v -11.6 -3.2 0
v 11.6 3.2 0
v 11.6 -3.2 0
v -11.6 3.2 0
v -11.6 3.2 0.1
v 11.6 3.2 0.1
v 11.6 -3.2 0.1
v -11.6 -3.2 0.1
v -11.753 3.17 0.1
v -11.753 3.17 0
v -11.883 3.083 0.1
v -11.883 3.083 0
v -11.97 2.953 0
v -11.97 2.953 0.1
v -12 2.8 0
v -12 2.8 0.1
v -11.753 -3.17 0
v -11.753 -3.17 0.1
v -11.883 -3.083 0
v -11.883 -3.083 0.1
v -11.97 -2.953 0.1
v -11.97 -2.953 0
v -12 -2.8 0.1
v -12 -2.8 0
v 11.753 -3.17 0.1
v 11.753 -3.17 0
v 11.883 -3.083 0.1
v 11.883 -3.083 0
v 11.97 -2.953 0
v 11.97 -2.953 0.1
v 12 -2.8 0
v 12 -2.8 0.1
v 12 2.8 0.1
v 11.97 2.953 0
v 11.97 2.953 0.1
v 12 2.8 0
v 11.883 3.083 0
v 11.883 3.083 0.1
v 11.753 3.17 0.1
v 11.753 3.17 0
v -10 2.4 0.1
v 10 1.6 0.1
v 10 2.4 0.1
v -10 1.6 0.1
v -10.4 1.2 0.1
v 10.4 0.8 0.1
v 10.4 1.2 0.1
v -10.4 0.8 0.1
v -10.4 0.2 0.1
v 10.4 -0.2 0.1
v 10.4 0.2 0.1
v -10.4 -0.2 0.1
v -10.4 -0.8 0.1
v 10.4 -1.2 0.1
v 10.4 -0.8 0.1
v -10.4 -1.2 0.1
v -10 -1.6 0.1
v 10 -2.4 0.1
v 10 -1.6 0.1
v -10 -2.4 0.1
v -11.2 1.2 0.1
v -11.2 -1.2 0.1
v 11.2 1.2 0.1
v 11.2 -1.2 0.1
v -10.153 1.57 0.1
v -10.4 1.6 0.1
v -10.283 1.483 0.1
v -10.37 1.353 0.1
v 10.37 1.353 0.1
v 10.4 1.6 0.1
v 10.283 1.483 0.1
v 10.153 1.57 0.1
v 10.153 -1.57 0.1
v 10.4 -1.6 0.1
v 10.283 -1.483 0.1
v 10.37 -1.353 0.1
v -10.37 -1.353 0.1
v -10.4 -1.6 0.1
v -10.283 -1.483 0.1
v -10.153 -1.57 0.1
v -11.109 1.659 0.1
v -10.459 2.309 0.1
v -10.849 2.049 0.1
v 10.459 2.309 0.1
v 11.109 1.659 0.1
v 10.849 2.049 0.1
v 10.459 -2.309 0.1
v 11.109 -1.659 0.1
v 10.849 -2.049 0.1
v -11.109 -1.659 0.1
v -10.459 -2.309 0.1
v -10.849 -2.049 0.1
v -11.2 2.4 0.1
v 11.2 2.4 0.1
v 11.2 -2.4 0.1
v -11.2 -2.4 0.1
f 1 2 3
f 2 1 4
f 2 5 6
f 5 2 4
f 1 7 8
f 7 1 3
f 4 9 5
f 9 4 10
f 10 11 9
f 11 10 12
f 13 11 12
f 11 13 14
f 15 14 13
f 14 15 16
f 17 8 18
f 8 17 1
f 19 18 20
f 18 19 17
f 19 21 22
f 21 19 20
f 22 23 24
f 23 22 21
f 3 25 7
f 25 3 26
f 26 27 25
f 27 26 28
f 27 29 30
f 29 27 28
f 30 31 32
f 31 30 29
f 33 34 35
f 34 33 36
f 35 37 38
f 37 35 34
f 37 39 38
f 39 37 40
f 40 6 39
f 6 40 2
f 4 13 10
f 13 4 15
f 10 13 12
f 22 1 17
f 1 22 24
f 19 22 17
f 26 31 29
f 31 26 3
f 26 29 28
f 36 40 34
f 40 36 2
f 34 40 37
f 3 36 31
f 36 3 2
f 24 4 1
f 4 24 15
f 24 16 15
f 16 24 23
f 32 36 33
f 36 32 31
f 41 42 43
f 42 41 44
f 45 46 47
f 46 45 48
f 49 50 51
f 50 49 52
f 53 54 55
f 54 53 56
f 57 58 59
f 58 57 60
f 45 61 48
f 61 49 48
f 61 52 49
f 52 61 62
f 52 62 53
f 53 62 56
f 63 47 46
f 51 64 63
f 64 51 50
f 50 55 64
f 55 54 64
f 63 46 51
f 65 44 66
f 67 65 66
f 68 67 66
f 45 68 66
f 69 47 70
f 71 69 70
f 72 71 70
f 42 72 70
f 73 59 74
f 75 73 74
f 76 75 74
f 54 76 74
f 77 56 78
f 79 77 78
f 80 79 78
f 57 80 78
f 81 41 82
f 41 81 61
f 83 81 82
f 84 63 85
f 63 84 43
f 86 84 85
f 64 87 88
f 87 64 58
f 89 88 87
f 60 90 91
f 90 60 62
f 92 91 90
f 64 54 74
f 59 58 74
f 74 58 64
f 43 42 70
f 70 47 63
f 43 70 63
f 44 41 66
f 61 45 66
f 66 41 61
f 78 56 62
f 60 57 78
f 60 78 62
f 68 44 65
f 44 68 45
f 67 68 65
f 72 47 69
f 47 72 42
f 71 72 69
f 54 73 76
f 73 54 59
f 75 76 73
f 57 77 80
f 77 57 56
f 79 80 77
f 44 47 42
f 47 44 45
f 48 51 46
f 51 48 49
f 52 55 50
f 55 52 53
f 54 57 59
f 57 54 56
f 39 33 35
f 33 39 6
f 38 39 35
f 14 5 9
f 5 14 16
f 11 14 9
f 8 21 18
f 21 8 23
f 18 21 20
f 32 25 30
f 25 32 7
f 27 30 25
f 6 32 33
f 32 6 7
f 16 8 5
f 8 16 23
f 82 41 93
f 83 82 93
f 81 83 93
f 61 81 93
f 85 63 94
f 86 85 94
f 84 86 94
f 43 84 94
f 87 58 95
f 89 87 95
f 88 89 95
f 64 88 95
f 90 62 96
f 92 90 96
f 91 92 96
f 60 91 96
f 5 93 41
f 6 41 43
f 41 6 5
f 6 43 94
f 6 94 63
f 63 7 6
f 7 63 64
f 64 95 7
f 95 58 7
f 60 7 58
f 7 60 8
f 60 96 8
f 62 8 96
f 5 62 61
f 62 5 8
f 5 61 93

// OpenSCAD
// file: ../p/4-4edge.scad
use <../lib.scad>
$fa=1; $fs=0.2;
function ldraw_lib__4_4edge(realsolid=false) = [
// 0 Circle 1.0
// 0 Name: 4-4edge.dat
// 0 Author: James Jessiman
// 0 !LDRAW_ORG Primitive UPDATE 2017-01
// 0 !LICENSE Licensed under CC BY 2.0 and CC BY 4.0 : see CAreadme.txt
// 
// 0 BFC CERTIFY CCW
  [0,"BFC","CERTIFY"],
  [0,"BFC","CCW"],
// 
// 0 !HISTORY 1998-12-15 [PTadmin] Official Update 1998-10
// 0 !HISTORY 2005-12-28 [PTadmin] Official Update 2005-01
// 0 !HISTORY 2007-06-24 [PTadmin] Header formatted for Contributor Agreement
// 0 !HISTORY 2008-07-01 [PTadmin] Official Update 2008-01
// 0 !HISTORY 2017-01-15 [Steffen] BFCed
// 0 !HISTORY 2017-12-30 [PTadmin] Official Update 2017-01
// 
// 
// 2 24 1 0 0 0.9239 0 0.3827
  [2,24,1,0,0,0.9239,0,0.3827],
// 2 24 0.9239 0 0.3827 0.7071 0 0.7071
  [2,24,0.9239,0,0.3827,0.7071,0,0.7071],
// 2 24 0.7071 0 0.7071 0.3827 0 0.9239
  [2,24,0.7071,0,0.7071,0.3827,0,0.9239],
// 2 24 0.3827 0 0.9239 0 0 1
  [2,24,0.3827,0,0.9239,0,0,1],
// 2 24 0 0 1 -0.3827 0 0.9239
  [2,24,0,0,1,-0.3827,0,0.9239],
// 2 24 -0.3827 0 0.9239 -0.7071 0 0.7071
  [2,24,-0.3827,0,0.9239,-0.7071,0,0.7071],
// 2 24 -0.7071 0 0.7071 -0.9239 0 0.3827
  [2,24,-0.7071,0,0.7071,-0.9239,0,0.3827],
// 2 24 -0.9239 0 0.3827 -1 0 -0
  [2,24,-0.9239,0,0.3827,-1,0,-0],
// 2 24 -1 0 -0 -0.9239 0 -0.3827
  [2,24,-1,0,-0,-0.9239,0,-0.3827],
// 2 24 -0.9239 0 -0.3827 -0.7071 0 -0.7071
  [2,24,-0.9239,0,-0.3827,-0.7071,0,-0.7071],
// 2 24 -0.7071 0 -0.7071 -0.3827 0 -0.9239
  [2,24,-0.7071,0,-0.7071,-0.3827,0,-0.9239],
// 2 24 -0.3827 0 -0.9239 0 0 -1
  [2,24,-0.3827,0,-0.9239,0,0,-1],
// 2 24 0 0 -1 0.3827 0 -0.9239
  [2,24,0,0,-1,0.3827,0,-0.9239],
// 2 24 0.3827 0 -0.9239 0.7071 0 -0.7071
  [2,24,0.3827,0,-0.9239,0.7071,0,-0.7071],
// 2 24 0.7071 0 -0.7071 0.9239 0 -0.3827
  [2,24,0.7071,0,-0.7071,0.9239,0,-0.3827],
// 2 24 0.9239 0 -0.3827 1 0 0
  [2,24,0.9239,0,-0.3827,1,0,0],
];
module ldraw_lib__4_4edge(step=0, col=false, unit=2/5, alt=false, line=0.2, solid=!$preview)
    makepoly(ldraw_lib__4_4edge(solid), step=step, col=col, unit=unit, alt=alt, line=line, solid=solid);
ldraw_lib__4_4edge(line=0.2);
// file: ../p/4-4disc.scad
use <../lib.scad>
$fa=1; $fs=0.2;
function ldraw_lib__4_4disc(realsolid=false) = [
// 0 Disc 1.0
// 0 Name: 4-4disc.dat
// 0 Author: James Jessiman
// 0 !LDRAW_ORG Primitive UPDATE 2002-02
// 0 !LICENSE Licensed under CC BY 2.0 and CC BY 4.0 : see CAreadme.txt
// 
// 0 BFC CERTIFY CCW
  [0,"BFC","CERTIFY"],
  [0,"BFC","CCW"],
// 
// 0 !HISTORY 1998-12-15 [PTadmin] Official Update 1998-10
// 0 !HISTORY 2002-03-23 [sbliss] Added BFC statement
// 0 !HISTORY 2002-04-25 [PTadmin] Official Update 2002-02
// 0 !HISTORY 2007-06-24 [PTadmin] Header formatted for Contributor Agreement
// 0 !HISTORY 2008-07-01 [PTadmin] Official Update 2008-01
// 
// 
// 3 16 0 0 0 1 0 0 0.9239 0 0.3827
  [3,16,0,0,0,1,0,0,0.9239,0,0.3827],
// 3 16 0 0 0 0.9239 0 0.3827 0.7071 0 0.7071
  [3,16,0,0,0,0.9239,0,0.3827,0.7071,0,0.7071],
// 3 16 0 0 0 0.7071 0 0.7071 0.3827 0 0.9239
  [3,16,0,0,0,0.7071,0,0.7071,0.3827,0,0.9239],
// 3 16 0 0 0 0.3827 0 0.9239 0 0 1
  [3,16,0,0,0,0.3827,0,0.9239,0,0,1],
// 3 16 0 0 0 0 0 1 -0.3827 0 0.9239
  [3,16,0,0,0,0,0,1,-0.3827,0,0.9239],
// 3 16 0 0 0 -0.3827 0 0.9239 -0.7071 0 0.7071
  [3,16,0,0,0,-0.3827,0,0.9239,-0.7071,0,0.7071],
// 3 16 0 0 0 -0.7071 0 0.7071 -0.9239 0 0.3827
  [3,16,0,0,0,-0.7071,0,0.7071,-0.9239,0,0.3827],
// 3 16 0 0 0 -0.9239 0 0.3827 -1 0 -0
  [3,16,0,0,0,-0.9239,0,0.3827,-1,0,-0],
// 3 16 0 0 0 -1 0 -0 -0.9239 0 -0.3827
  [3,16,0,0,0,-1,0,-0,-0.9239,0,-0.3827],
// 3 16 0 0 0 -0.9239 0 -0.3827 -0.7071 0 -0.7071
  [3,16,0,0,0,-0.9239,0,-0.3827,-0.7071,0,-0.7071],
// 3 16 0 0 0 -0.7071 0 -0.7071 -0.3827 0 -0.9239
  [3,16,0,0,0,-0.7071,0,-0.7071,-0.3827,0,-0.9239],
// 3 16 0 0 0 -0.3827 0 -0.9239 0 0 -1
  [3,16,0,0,0,-0.3827,0,-0.9239,0,0,-1],
// 3 16 0 0 0 0 0 -1 0.3827 0 -0.9239
  [3,16,0,0,0,0,0,-1,0.3827,0,-0.9239],
// 3 16 0 0 0 0.3827 0 -0.9239 0.7071 0 -0.7071
  [3,16,0,0,0,0.3827,0,-0.9239,0.7071,0,-0.7071],
// 3 16 0 0 0 0.7071 0 -0.7071 0.9239 0 -0.3827
  [3,16,0,0,0,0.7071,0,-0.7071,0.9239,0,-0.3827],
// 3 16 0 0 0 0.9239 0 -0.3827 1 0 0
  [3,16,0,0,0,0.9239,0,-0.3827,1,0,0],
// 0
];
module ldraw_lib__4_4disc(step=0, col=false, unit=2/5, alt=false, line=0.2, solid=!$preview)
    makepoly(ldraw_lib__4_4disc(solid), step=step, col=col, unit=unit, alt=alt, line=line, solid=solid);
ldraw_lib__4_4disc(line=0.2);
// file: ../p/4-4cyli.scad
use <../lib.scad>
$fa=1; $fs=0.2;
function ldraw_lib__4_4cyli(realsolid=false) = [
// 0 Cylinder 1.0
// 0 Name: 4-4cyli.dat
// 0 Author: James Jessiman
// 0 !LDRAW_ORG Primitive UPDATE 2005-01
// 0 !LICENSE Licensed under CC BY 2.0 and CC BY 4.0 : see CAreadme.txt
// 
// 0 BFC CERTIFY CCW
  [0,"BFC","CERTIFY"],
  [0,"BFC","CCW"],
// 
// 0 !HISTORY 1998-12-15 [PTadmin] Official Update 1998-10
// 0 !HISTORY 2002-03-23 [sbliss] Added BFC statement; merged headers from files in distributions LDraw 0.27 and Complete.
// 0 !HISTORY 2002-04-25 [PTadmin] Official Update 2002-02
// 0 !HISTORY 2004-12-14 [guyvivan] BFC CCW
// 0 !HISTORY 2005-12-28 [PTadmin] Official Update 2005-01
// 0 !HISTORY 2007-06-24 [PTadmin] Header formatted for Contributor Agreement
// 0 !HISTORY 2008-07-01 [PTadmin] Official Update 2008-01
// 
// 
// 4 16 1 1 0 0.9239 1 0.3827 0.9239 0 0.3827 1 0 0
  [4,16,1,1,0,0.9239,1,0.3827,0.9239,0,0.3827,1,0,0],
// 5 24 1 0 0 1 1 0 0.9239 0 0.3827 0.9239 0 -0.3827
  [5,24,1,0,0,1,1,0,0.9239,0,0.3827,0.9239,0,-0.3827],
// 4 16 0.9239 1 0.3827 0.7071 1 0.7071 0.7071 0 0.7071 0.9239 0 0.3827
  [4,16,0.9239,1,0.3827,0.7071,1,0.7071,0.7071,0,0.7071,0.9239,0,0.3827],
// 5 24 0.9239 0 0.3827 0.9239 1 0.3827 0.7071 0 0.7071 1 0 0
  [5,24,0.9239,0,0.3827,0.9239,1,0.3827,0.7071,0,0.7071,1,0,0],
// 4 16 0.7071 1 0.7071 0.3827 1 0.9239 0.3827 0 0.9239 0.7071 0 0.7071
  [4,16,0.7071,1,0.7071,0.3827,1,0.9239,0.3827,0,0.9239,0.7071,0,0.7071],
// 5 24 0.7071 0 0.7071 0.7071 1 0.7071 0.3827 0 0.9239 0.9239 0 0.3827
  [5,24,0.7071,0,0.7071,0.7071,1,0.7071,0.3827,0,0.9239,0.9239,0,0.3827],
// 4 16 0.3827 1 0.9239 0 1 1 0 0 1 0.3827 0 0.9239
  [4,16,0.3827,1,0.9239,0,1,1,0,0,1,0.3827,0,0.9239],
// 5 24 0.3827 0 0.9239 0.3827 1 0.9239 0 0 1 0.7071 0 0.7071
  [5,24,0.3827,0,0.9239,0.3827,1,0.9239,0,0,1,0.7071,0,0.7071],
// 4 16 0 1 1 -0.3827 1 0.9239 -0.3827 0 0.9239 0 0 1
  [4,16,0,1,1,-0.3827,1,0.9239,-0.3827,0,0.9239,0,0,1],
// 5 24 0 0 1 0 1 1 -0.3827 0 0.9239 0.3827 0 0.9239
  [5,24,0,0,1,0,1,1,-0.3827,0,0.9239,0.3827,0,0.9239],
// 4 16 -0.3827 1 0.9239 -0.7071 1 0.7071 -0.7071 0 0.7071 -0.3827 0 0.9239
  [4,16,-0.3827,1,0.9239,-0.7071,1,0.7071,-0.7071,0,0.7071,-0.3827,0,0.9239],
// 5 24 -0.3827 0 0.9239 -0.3827 1 0.9239 -0.7071 0 0.7071 0 0 1
  [5,24,-0.3827,0,0.9239,-0.3827,1,0.9239,-0.7071,0,0.7071,0,0,1],
// 4 16 -0.7071 1 0.7071 -0.9239 1 0.3827 -0.9239 0 0.3827 -0.7071 0 0.7071
  [4,16,-0.7071,1,0.7071,-0.9239,1,0.3827,-0.9239,0,0.3827,-0.7071,0,0.7071],
// 5 24 -0.7071 0 0.7071 -0.7071 1 0.7071 -0.9239 0 0.3827 -0.3827 0 0.9239
  [5,24,-0.7071,0,0.7071,-0.7071,1,0.7071,-0.9239,0,0.3827,-0.3827,0,0.9239],
// 4 16 -0.9239 1 0.3827 -1 1 0 -1 0 0 -0.9239 0 0.3827
  [4,16,-0.9239,1,0.3827,-1,1,0,-1,0,0,-0.9239,0,0.3827],
// 5 24 -0.9239 0 0.3827 -0.9239 1 0.3827 -1 0 0 -0.7071 0 0.7071
  [5,24,-0.9239,0,0.3827,-0.9239,1,0.3827,-1,0,0,-0.7071,0,0.7071],
// 4 16 -1 1 0 -0.9239 1 -0.3827 -0.9239 0 -0.3827 -1 0 0
  [4,16,-1,1,0,-0.9239,1,-0.3827,-0.9239,0,-0.3827,-1,0,0],
// 5 24 -1 0 0 -1 1 0 -0.9239 0 -0.3827 -0.9239 0 0.3827
  [5,24,-1,0,0,-1,1,0,-0.9239,0,-0.3827,-0.9239,0,0.3827],
// 4 16 -0.9239 1 -0.3827 -0.7071 1 -0.7071 -0.7071 0 -0.7071 -0.9239 0 -0.3827
  [4,16,-0.9239,1,-0.3827,-0.7071,1,-0.7071,-0.7071,0,-0.7071,-0.9239,0,-0.3827],
// 5 24 -0.9239 0 -0.3827 -0.9239 1 -0.3827 -0.7071 0 -0.7071 -1 0 0
  [5,24,-0.9239,0,-0.3827,-0.9239,1,-0.3827,-0.7071,0,-0.7071,-1,0,0],
// 4 16 -0.7071 1 -0.7071 -0.3827 1 -0.9239 -0.3827 0 -0.9239 -0.7071 0 -0.7071
  [4,16,-0.7071,1,-0.7071,-0.3827,1,-0.9239,-0.3827,0,-0.9239,-0.7071,0,-0.7071],
// 5 24 -0.7071 0 -0.7071 -0.7071 1 -0.7071 -0.3827 0 -0.9239 -0.9239 0 -0.3827
  [5,24,-0.7071,0,-0.7071,-0.7071,1,-0.7071,-0.3827,0,-0.9239,-0.9239,0,-0.3827],
// 4 16 -0.3827 1 -0.9239 0 1 -1 0 0 -1 -0.3827 0 -0.9239
  [4,16,-0.3827,1,-0.9239,0,1,-1,0,0,-1,-0.3827,0,-0.9239],
// 5 24 -0.3827 0 -0.9239 -0.3827 1 -0.9239 0 0 -1 -0.7071 0 -0.7071
  [5,24,-0.3827,0,-0.9239,-0.3827,1,-0.9239,0,0,-1,-0.7071,0,-0.7071],
// 4 16 0 1 -1 0.3827 1 -0.9239 0.3827 0 -0.9239 0 0 -1
  [4,16,0,1,-1,0.3827,1,-0.9239,0.3827,0,-0.9239,0,0,-1],
// 5 24 0 0 -1 0 1 -1 0.3827 0 -0.9239 -0.3827 0 -0.9239
  [5,24,0,0,-1,0,1,-1,0.3827,0,-0.9239,-0.3827,0,-0.9239],
// 4 16 0.3827 1 -0.9239 0.7071 1 -0.7071 0.7071 0 -0.7071 0.3827 0 -0.9239
  [4,16,0.3827,1,-0.9239,0.7071,1,-0.7071,0.7071,0,-0.7071,0.3827,0,-0.9239],
// 5 24 0.3827 0 -0.9239 0.3827 1 -0.9239 0.7071 0 -0.7071 0 0 -1
  [5,24,0.3827,0,-0.9239,0.3827,1,-0.9239,0.7071,0,-0.7071,0,0,-1],
// 4 16 0.7071 1 -0.7071 0.9239 1 -0.3827 0.9239 0 -0.3827 0.7071 0 -0.7071
  [4,16,0.7071,1,-0.7071,0.9239,1,-0.3827,0.9239,0,-0.3827,0.7071,0,-0.7071],
// 5 24 0.7071 0 -0.7071 0.7071 1 -0.7071 0.9239 0 -0.3827 0.3827 0 -0.9239
  [5,24,0.7071,0,-0.7071,0.7071,1,-0.7071,0.9239,0,-0.3827,0.3827,0,-0.9239],
// 4 16 0.9239 1 -0.3827 1 1 0 1 0 0 0.9239 0 -0.3827
  [4,16,0.9239,1,-0.3827,1,1,0,1,0,0,0.9239,0,-0.3827],
// 5 24 0.9239 0 -0.3827 0.9239 1 -0.3827 1 0 0 0.7071 0 -0.7071
  [5,24,0.9239,0,-0.3827,0.9239,1,-0.3827,1,0,0,0.7071,0,-0.7071],
// 0
];
module ldraw_lib__4_4cyli(step=0, col=false, unit=2/5, alt=false, line=0.2, solid=!$preview)
    makepoly(ldraw_lib__4_4cyli(solid), step=step, col=col, unit=unit, alt=alt, line=line, solid=solid);
ldraw_lib__4_4cyli(line=0.2);
// file: ../p/stud3.scad
use <../lib.scad>
use <4-4cyli.scad>
use <4-4disc.scad>
use <4-4edge.scad>
$fa=1; $fs=0.2;
function ldraw_lib__stud3(realsolid=false) = realsolid ? 
    [openscad(translate([0,0,-eps()], o=cylinder(4+eps(), r=4)),2)] : [
// 0 Stud Tube Solid
// 0 Name: stud3.dat
// 0 Author: James Jessiman
// 0 !LDRAW_ORG Primitive UPDATE 2012-01
// 0 !LICENSE Licensed under CC BY 2.0 and CC BY 4.0 : see CAreadme.txt
// 
// 0 BFC CERTIFY CCW
  [0,"BFC","CERTIFY"],
  [0,"BFC","CCW"],
// 
// 0 !HISTORY 2002-04-04 [sbliss] Modified for BFC compliance
// 0 !HISTORY 2002-04-25 [PTadmin] Official Update 2002-02
// 0 !HISTORY 2007-06-24 [PTadmin] Header formatted for Contributor Agreement
// 0 !HISTORY 2008-07-01 [PTadmin] Official Update 2008-01
// 0 !HISTORY 2012-02-16 [Philo] Changed to CCW
// 0 !HISTORY 2012-03-30 [PTadmin] Official Update 2012-01
// 
// 
// 1 16 0 -4 0 4 0 0 0 1 0 0 0 4 4-4edge.dat
  [1,16,0,-4,0,4,0,0,0,1,0,0,0,4, ldraw_lib__4_4edge(realsolid)],
// 1 16 0 0 0 4 0 0 0 1 0 0 0 4 4-4edge.dat
  [1,16,0,0,0,4,0,0,0,1,0,0,0,4, ldraw_lib__4_4edge(realsolid)],
// 1 16 0 -4 0 4 0 0 0 1 0 0 0 4 4-4disc.dat
  [1,16,0,-4,0,4,0,0,0,1,0,0,0,4, ldraw_lib__4_4disc(realsolid)],
// 1 16 0 -4 0 4 0 0 0 4 0 0 0 4 4-4cyli.dat
  [1,16,0,-4,0,4,0,0,0,4,0,0,0,4, ldraw_lib__4_4cyli(realsolid)],
];
module ldraw_lib__stud3(step=0, col=false, unit=2/5, alt=false, line=0.2, solid=!$preview)
    makepoly(ldraw_lib__stud3(solid), step=step, col=col, unit=unit, alt=alt, line=line, solid=solid);
ldraw_lib__stud3(line=0.2);
// file: ../p/stud.scad
use <../lib.scad>
use <4-4cyli.scad>
use <4-4disc.scad>
use <4-4edge.scad>
$fa=1; $fs=0.2;
function ldraw_lib__stud(realsolid=false) = realsolid ? 
    [openscad(translate([0,0,-eps()], o=cylinder(4+eps(), r=6)),2)] : [
// 0 Stud
// 0 Name: stud.dat
// 0 Author: James Jessiman
// 0 !LDRAW_ORG Primitive UPDATE 2012-01
// 0 !LICENSE Licensed under CC BY 2.0 and CC BY 4.0 : see CAreadme.txt
// 
// 0 BFC CERTIFY CCW
  [0,"BFC","CERTIFY"],
  [0,"BFC","CCW"],
// 
// 0 !HISTORY 2002-04-04 [sbliss] Modified for BFC compliance
// 0 !HISTORY 2002-04-25 [PTadmin] Official Update 2002-02
// 0 !HISTORY 2007-06-24 [PTadmin] Header formatted for Contributor Agreement
// 0 !HISTORY 2008-07-01 [PTadmin] Official Update 2008-01
// 0 !HISTORY 2012-02-16 [Philo] Changed to CCW
// 0 !HISTORY 2012-03-30 [PTadmin] Official Update 2012-01
// 
// 
// 1 16 0 0 0 6 0 0 0 1 0 0 0 6 4-4edge.dat
  [1,16,0,0,0,6,0,0,0,1,0,0,0,6, ldraw_lib__4_4edge(realsolid)],
// 1 16 0 -4 0 6 0 0 0 1 0 0 0 6 4-4edge.dat
  [1,16,0,-4,0,6,0,0,0,1,0,0,0,6, ldraw_lib__4_4edge(realsolid)],
// 1 16 0 0 0 6 0 0 0 -4 0 0 0 6 4-4cyli.dat
  [1,16,0,0,0,6,0,0,0,-4,0,0,0,6, ldraw_lib__4_4cyli(realsolid)],
// 1 16 0 -4 0 6 0 0 0 1 0 0 0 6 4-4disc.dat
  [1,16,0,-4,0,6,0,0,0,1,0,0,0,6, ldraw_lib__4_4disc(realsolid)],
];
module ldraw_lib__stud(step=0, col=false, unit=2/5, alt=false, line=0.2, solid=!$preview)
    makepoly(ldraw_lib__stud(solid), step=step, col=col, unit=unit, alt=alt, line=line, solid=solid);
ldraw_lib__stud(line=0.2);
// file: ../p/box5.scad
use <../lib.scad>
$fa=1; $fs=0.2;
function ldraw_lib__box5(realsolid=false) = [
// 0 Box with 5 Faces and All Edges
// 0 Name: box5.dat
// 0 Author: James Jessiman
// 0 !LDRAW_ORG Primitive UPDATE 2012-01
// 0 !LICENSE Licensed under CC BY 2.0 and CC BY 4.0 : see CAreadme.txt
// 
// 0 BFC CERTIFY CCW
  [0,"BFC","CERTIFY"],
  [0,"BFC","CCW"],
// 
// 0 !HISTORY 2002-04-03 [sbliss] Modified for BFC compliance
// 0 !HISTORY 2002-04-25 [PTadmin] Official Update 2002-02
// 0 !HISTORY 2007-06-24 [PTadmin] Header formatted for Contributor Agreement
// 0 !HISTORY 2008-07-01 [PTadmin] Official Update 2008-01
// 0 !HISTORY 2012-02-16 [Philo] Changed to CCW
// 0 !HISTORY 2012-03-30 [PTadmin] Official Update 2012-01
// 
// 
// 2 24 1 1 1 -1 1 1
  [2,24,1,1,1,-1,1,1],
// 2 24 -1 1 1 -1 1 -1
  [2,24,-1,1,1,-1,1,-1],
// 2 24 -1 1 -1 1 1 -1
  [2,24,-1,1,-1,1,1,-1],
// 2 24 1 1 -1 1 1 1
  [2,24,1,1,-1,1,1,1],
// 2 24 1 0 1 -1 0 1
  [2,24,1,0,1,-1,0,1],
// 2 24 -1 0 1 -1 0 -1
  [2,24,-1,0,1,-1,0,-1],
// 2 24 -1 0 -1 1 0 -1
  [2,24,-1,0,-1,1,0,-1],
// 2 24 1 0 -1 1 0 1
  [2,24,1,0,-1,1,0,1],
// 2 24 1 0 1 1 1 1
  [2,24,1,0,1,1,1,1],
// 2 24 -1 0 1 -1 1 1
  [2,24,-1,0,1,-1,1,1],
// 2 24 1 0 -1 1 1 -1
  [2,24,1,0,-1,1,1,-1],
// 2 24 -1 0 -1 -1 1 -1
  [2,24,-1,0,-1,-1,1,-1],
// 4 16 -1 1 1 1 1 1 1 1 -1 -1 1 -1
  [4,16,-1,1,1,1,1,1,1,1,-1,-1,1,-1],
// 4 16 -1 1 1 -1 0 1 1 0 1 1 1 1
  [4,16,-1,1,1,-1,0,1,1,0,1,1,1,1],
// 4 16 -1 1 -1 -1 0 -1 -1 0 1 -1 1 1
  [4,16,-1,1,-1,-1,0,-1,-1,0,1,-1,1,1],
// 4 16 1 1 -1 1 0 -1 -1 0 -1 -1 1 -1
  [4,16,1,1,-1,1,0,-1,-1,0,-1,-1,1,-1],
// 4 16 1 1 1 1 0 1 1 0 -1 1 1 -1
  [4,16,1,1,1,1,0,1,1,0,-1,1,1,-1],
];
module ldraw_lib__box5(step=0, col=false, unit=2/5, alt=false, line=0.2, solid=!$preview)
    makepoly(ldraw_lib__box5(solid), step=step, col=col, unit=unit, alt=alt, line=line, solid=solid);
ldraw_lib__box5(line=0.2);
// file: ../p/box4t.scad
use <../lib.scad>
$fa=1; $fs=0.2;
function ldraw_lib__box4t(realsolid=false) = [
// 0 Box with 4 Adjacent Faces and All Edges
// 0 Name: box4t.dat
// 0 Author: Tore Eriksson [Tore_Eriksson]
// 0 !LDRAW_ORG Primitive UPDATE 2003-02
// 0 !LICENSE Licensed under CC BY 2.0 and CC BY 4.0 : see CAreadme.txt
// 
// 0 BFC CERTIFY CCW
  [0,"BFC","CERTIFY"],
  [0,"BFC","CCW"],
// 
// 0 !HISTORY 1997-09-29 [PTadmin] Official Update 1997-15
// 0 !HISTORY 2002-08-31 [izanette] Modified with WINDZ for BFC compliance
// 0 !HISTORY 2003-08-01 [PTadmin] Official Update 2003-02
// 0 !HISTORY 2007-06-24 [PTadmin] Header formatted for Contributor Agreement
// 0 !HISTORY 2008-07-01 [PTadmin] Official Update 2008-01
// 
// 
// 2 24 1 1 1 -1 1 1
  [2,24,1,1,1,-1,1,1],
// 2 24 -1 1 1 -1 1 -1
  [2,24,-1,1,1,-1,1,-1],
// 2 24 -1 1 -1 1 1 -1
  [2,24,-1,1,-1,1,1,-1],
// 2 24 1 1 -1 1 1 1
  [2,24,1,1,-1,1,1,1],
// 2 24 1 0 1 -1 0 1
  [2,24,1,0,1,-1,0,1],
// 2 24 -1 0 1 -1 0 -1
  [2,24,-1,0,1,-1,0,-1],
// 2 24 -1 0 -1 1 0 -1
  [2,24,-1,0,-1,1,0,-1],
// 2 24 1 0 -1 1 0 1
  [2,24,1,0,-1,1,0,1],
// 2 24 1 0 1 1 1 1
  [2,24,1,0,1,1,1,1],
// 2 24 -1 0 1 -1 1 1
  [2,24,-1,0,1,-1,1,1],
// 2 24 1 0 -1 1 1 -1
  [2,24,1,0,-1,1,1,-1],
// 2 24 -1 0 -1 -1 1 -1
  [2,24,-1,0,-1,-1,1,-1],
// 4 16 1 1 1 1 1 -1 -1 1 -1 -1 1 1
  [4,16,1,1,1,1,1,-1,-1,1,-1,-1,1,1],
// 4 16 1 1 1 -1 1 1 -1 0 1 1 0 1
  [4,16,1,1,1,-1,1,1,-1,0,1,1,0,1],
// 4 16 -1 1 1 -1 1 -1 -1 0 -1 -1 0 1
  [4,16,-1,1,1,-1,1,-1,-1,0,-1,-1,0,1],
// 0 4 16 -1 1 -1 -1 0 -1 1 0 -1 1 1 -1
// 4 16 1 1 -1 1 1 1 1 0 1 1 0 -1
  [4,16,1,1,-1,1,1,1,1,0,1,1,0,-1],
// 0
];
module ldraw_lib__box4t(step=0, col=false, unit=2/5, alt=false, line=0.2, solid=!$preview)
    makepoly(ldraw_lib__box4t(solid), step=step, col=col, unit=unit, alt=alt, line=line, solid=solid);
ldraw_lib__box4t(line=0.2);
// file: s/3004s01.scad
use <../../lib.scad>
use <../../p/box4t.scad>
use <../../p/box5.scad>
use <../../p/stud.scad>
use <../../p/stud3.scad>
$fa=1; $fs=0.2;
function ldraw_lib__s__3004s01(realsolid=false) = [
// 0 ~Brick  1 x  2 without Front Face
// 0 Name: s\3004s01.dat
// 0 Author: James Jessiman
// 0 !LDRAW_ORG Subpart UPDATE 2003-03
// 0 !LICENSE Licensed under CC BY 2.0 and CC BY 4.0 : see CAreadme.txt
// 
// 0 BFC CERTIFY CCW
  [0,"BFC","CERTIFY"],
  [0,"BFC","CCW"],
// 
// 0 !HISTORY 2003-09-07 [jriley] Subfiling, BFC
// 0 !HISTORY 2003-12-19 [PTadmin] Official Update 2003-03
// 0 !HISTORY 2007-08-29 [PTadmin] Header formatted for Contributor Agreement
// 0 !HISTORY 2008-07-01 [PTadmin] Official Update 2008-01
// 
// 
// 1 16 0 4 0 1 0 0 0 -5 0 0 0 1 stud3.dat
  [1,16,0,4,0,1,0,0,0,-5,0,0,0,1, ldraw_lib__stud3(realsolid)],
// 0 BFC INVERTNEXT
  [0,"BFC","INVERTNEXT"],
// 1 16 0 24 0 16 0 0 0 -20 0 0 0 6 box5.dat
  [1,16,0,24,0,16,0,0,0,-20,0,0,0,6, ldraw_lib__box5(realsolid)],
// 4 16 20 24 10 16 24 6 -16 24 6 -20 24 10
  [4,16,20,24,10,16,24,6,-16,24,6,-20,24,10],
// 4 16 -20 24 10 -16 24 6 -16 24 -6 -20 24 -10
  [4,16,-20,24,10,-16,24,6,-16,24,-6,-20,24,-10],
// 4 16 -20 24 -10 -16 24 -6 16 24 -6 20 24 -10
  [4,16,-20,24,-10,-16,24,-6,16,24,-6,20,24,-10],
// 4 16 20 24 -10 16 24 -6 16 24 6 20 24 10
  [4,16,20,24,-10,16,24,-6,16,24,6,20,24,10],
// 1 16 0 24 0 20 0 0 0 -24 0 0 0 10 box4t.dat
  [1,16,0,24,0,20,0,0,0,-24,0,0,0,10, ldraw_lib__box4t(realsolid)],
// 1 16 10 0 0 1 0 0 0 1 0 0 0 1 stud.dat
  [1,16,10,0,0,1,0,0,0,1,0,0,0,1, ldraw_lib__stud(realsolid)],
// 1 16 -10 0 0 1 0 0 0 1 0 0 0 1 stud.dat
  [1,16,-10,0,0,1,0,0,0,1,0,0,0,1, ldraw_lib__stud(realsolid)],
// 0
];
module ldraw_lib__s__3004s01(step=0, col=false, unit=2/5, alt=false, line=0.2, solid=!$preview)
    makepoly(ldraw_lib__s__3004s01(solid), step=step, col=col, unit=unit, alt=alt, line=line, solid=solid);
ldraw_lib__s__3004s01(line=0.2);
// file: 3004.scad
use <../lib.scad>
use <s/3004s01.scad>
$fa=1; $fs=0.2;
function ldraw_lib__3004(realsolid=false) = [
// 0 Brick  1 x  2
// 0 Name: 3004.dat
// 0 Author: James Jessiman
// 0 !LDRAW_ORG Part UPDATE 2022-05
// 0 !LICENSE Licensed under CC BY 2.0 and CC BY 4.0 : see CAreadme.txt
// 
// 0 BFC CERTIFY CCW
  [0,"BFC","CERTIFY"],
  [0,"BFC","CCW"],
// 
// 0 !HISTORY 2001-10-26 [PTadmin] Official Update 2001-01
// 0 !HISTORY 2002-05-07 {unknown} BFC Certification
// 0 !HISTORY 2002-06-11 [PTadmin] Official Update 2002-03
// 0 !HISTORY 2007-05-07 [PTadmin] Header formatted for Contributor Agreement
// 0 !HISTORY 2008-07-01 [PTadmin] Official Update 2008-01
// 0 !HISTORY 2022-08-04 [MagFors] Using subfile
// 0 !HISTORY 2022-09-15 [PTadmin] Official Update 2022-05
// 
// 
// 1 16 0 0 0 1 0 0 0 1 0 0 0 1 s\3004s01.dat
  [1,16,0,0,0,1,0,0,0,1,0,0,0,1, ldraw_lib__s__3004s01(realsolid)],
// 4 16 -20 24 -10 20 24 -10 20 0 -10 -20 0 -10
  [4,16,-20,24,-10,20,24,-10,20,0,-10,-20,0,-10],
];
module ldraw_lib__3004(step=0, col=false, unit=2/5, alt=false, line=0.2, solid=!$preview)
    makepoly(ldraw_lib__3004(solid), step=step, col=col, unit=unit, alt=alt, line=line, solid=solid);
ldraw_lib__3004(line=0.2);
// file: ../p/box3u12.scad
use <../lib.scad>
$fa=1; $fs=0.2;
function ldraw_lib__box3u12(realsolid=false) = [
// 0 Box with 3 Parallel Faces without Any Edges
// 0 Name: box3u12.dat
// 0 Author: J.C. Tchang [tchang]
// 0 !LDRAW_ORG Primitive UPDATE 2014-02
// 0 !LICENSE Licensed under CC BY 2.0 and CC BY 4.0 : see CAreadme.txt
// 
// 0 BFC CERTIFY CCW
  [0,"BFC","CERTIFY"],
  [0,"BFC","CCW"],
// 
// 0 !HISTORY 2014-12-23 [PTadmin] Official Update 2014-02
// 
// 
// 4 16 -1 1 1 1 1 1 1 1 -1 -1 1 -1
  [4,16,-1,1,1,1,1,1,1,1,-1,-1,1,-1],
// 4 16 -1 1 1 -1 0 1 1 0 1 1 1 1
  [4,16,-1,1,1,-1,0,1,1,0,1,1,1,1],
// 4 16 1 1 -1 1 0 -1 -1 0 -1 -1 1 -1
  [4,16,1,1,-1,1,0,-1,-1,0,-1,-1,1,-1],
];
module ldraw_lib__box3u12(step=0, col=false, unit=2/5, alt=false, line=0.2, solid=!$preview)
    makepoly(ldraw_lib__box3u12(solid), step=step, col=col, unit=unit, alt=alt, line=line, solid=solid);
ldraw_lib__box3u12(line=0.2);
// file: ../p/1-4ndis.scad
use <../lib.scad>
$fa=1; $fs=0.2;
function ldraw_lib__1_4ndis(realsolid=false) = [
// 0 Disc Negative 0.25
// 0 Name: 1-4ndis.dat
// 0 Author: James Jessiman
// 0 !LDRAW_ORG Primitive UPDATE 2012-01
// 0 !LICENSE Licensed under CC BY 2.0 and CC BY 4.0 : see CAreadme.txt
// 
// 0 BFC CERTIFY CCW
  [0,"BFC","CERTIFY"],
  [0,"BFC","CCW"],
// 
// 0 !HISTORY 2002-03-23 [sbliss] Added BFC Statement
// 0 !HISTORY 2002-04-25 [PTadmin] Official Update 2002-02
// 0 !HISTORY 2007-06-22 [PTadmin] Header formatted for Contributor Agreement
// 0 !HISTORY 2008-07-01 [PTadmin] Official Update 2008-01
// 0 !HISTORY 2012-02-16 [Philo] Changed to CCW
// 0 !HISTORY 2012-03-30 [PTadmin] Official Update 2012-01
// 
// 
// 3 16 0.9239 0 0.3827 1 0 0 1 0 1
  [3,16,0.9239,0,0.3827,1,0,0,1,0,1],
// 3 16 0.7071 0 0.7071 0.9239 0 0.3827 1 0 1
  [3,16,0.7071,0,0.7071,0.9239,0,0.3827,1,0,1],
// 3 16 0.3827 0 0.9239 0.7071 0 0.7071 1 0 1
  [3,16,0.3827,0,0.9239,0.7071,0,0.7071,1,0,1],
// 3 16 0 0 1 0.3827 0 0.9239 1 0 1
  [3,16,0,0,1,0.3827,0,0.9239,1,0,1],
];
module ldraw_lib__1_4ndis(step=0, col=false, unit=2/5, alt=false, line=0.2, solid=!$preview)
    makepoly(ldraw_lib__1_4ndis(solid), step=step, col=col, unit=unit, alt=alt, line=line, solid=solid);
ldraw_lib__1_4ndis(line=0.2);
// file: ../p/1-4cyli.scad
use <../lib.scad>
$fa=1; $fs=0.2;
function ldraw_lib__1_4cyli(realsolid=false) = [
// 0 Cylinder 0.25
// 0 Name: 1-4cyli.dat
// 0 Author: James Jessiman
// 0 !LDRAW_ORG Primitive UPDATE 2012-01
// 0 !LICENSE Licensed under CC BY 2.0 and CC BY 4.0 : see CAreadme.txt
// 
// 0 BFC CERTIFY CCW
  [0,"BFC","CERTIFY"],
  [0,"BFC","CCW"],
// 
// 0 !HISTORY 2002-03-23 [sbliss] Added BFC statement.
// 0 !HISTORY 2002-04-25 [PTadmin] Official Update 2002-02
// 0 !HISTORY 2007-06-22 [PTadmin] Header formatted for Contributor Agreement
// 0 !HISTORY 2008-07-01 [PTadmin] Official Update 2008-01
// 0 !HISTORY 2012-02-16 [Philo] Changed to CCW
// 0 !HISTORY 2012-03-30 [PTadmin] Official Update 2012-01
// 
// 
// 4 16 1 1 0 0.9239 1 0.3827 0.9239 0 0.3827 1 0 0
  [4,16,1,1,0,0.9239,1,0.3827,0.9239,0,0.3827,1,0,0],
// 5 24 1 0 0 1 1 0 0.9239 0 0.3827 1 0 -1
  [5,24,1,0,0,1,1,0,0.9239,0,0.3827,1,0,-1],
// 4 16 0.9239 1 0.3827 0.7071 1 0.7071 0.7071 0 0.7071 0.9239 0 0.3827
  [4,16,0.9239,1,0.3827,0.7071,1,0.7071,0.7071,0,0.7071,0.9239,0,0.3827],
// 5 24 0.9239 0 0.3827 0.9239 1 0.3827 0.7071 0 0.7071 1 0 0
  [5,24,0.9239,0,0.3827,0.9239,1,0.3827,0.7071,0,0.7071,1,0,0],
// 4 16 0.7071 1 0.7071 0.3827 1 0.9239 0.3827 0 0.9239 0.7071 0 0.7071
  [4,16,0.7071,1,0.7071,0.3827,1,0.9239,0.3827,0,0.9239,0.7071,0,0.7071],
// 5 24 0.7071 0 0.7071 0.7071 1 0.7071 0.3827 0 0.9239 0.9239 0 0.3827
  [5,24,0.7071,0,0.7071,0.7071,1,0.7071,0.3827,0,0.9239,0.9239,0,0.3827],
// 4 16 0.3827 1 0.9239 0 1 1 0 0 1 0.3827 0 0.9239
  [4,16,0.3827,1,0.9239,0,1,1,0,0,1,0.3827,0,0.9239],
// 5 24 0.3827 0 0.9239 0.3827 1 0.9239 0 0 1 0.7071 0 0.7071
  [5,24,0.3827,0,0.9239,0.3827,1,0.9239,0,0,1,0.7071,0,0.7071],
// 5 24 0 0 1 0 1 1 0.3827 0 0.9239 -1 0 1
  [5,24,0,0,1,0,1,1,0.3827,0,0.9239,-1,0,1],
];
module ldraw_lib__1_4cyli(step=0, col=false, unit=2/5, alt=false, line=0.2, solid=!$preview)
    makepoly(ldraw_lib__1_4cyli(solid), step=step, col=col, unit=unit, alt=alt, line=line, solid=solid);
ldraw_lib__1_4cyli(line=0.2);
// file: ../p/1-4chrd.scad
use <../lib.scad>
$fa=1; $fs=0.2;
function ldraw_lib__1_4chrd(realsolid=false) = [
// 0 Chord 0.25
// 0 Name: 1-4chrd.dat
// 0 Author: Tony Hafner [hafhead]
// 0 !LDRAW_ORG Primitive UPDATE 2012-02
// 0 !LICENSE Licensed under CC BY 2.0 and CC BY 4.0 : see CAreadme.txt
// 
// 0 BFC CERTIFY CCW
  [0,"BFC","CERTIFY"],
  [0,"BFC","CCW"],
// 
// 0 !HISTORY 2004-04-22 [PTadmin] Official Update 2004-02
// 0 !HISTORY 2007-10-09 [PTadmin] Header formatted for Contributor Agreement
// 0 !HISTORY 2008-07-01 [PTadmin] Official Update 2008-01
// 0 !HISTORY 2012-08-02 [MMR1988] Re-creation with PrimGen2 and Rectifier
// 0 !HISTORY 2012-08-09 [PTadmin] Official Update 2012-02
// 
// 
// 4 16 0.9239 0 0.3827 0.3827 0 0.9239 0 0 1 1 0 0
  [4,16,0.9239,0,0.3827,0.3827,0,0.9239,0,0,1,1,0,0],
// 3 16 0.7071 0 0.7071 0.3827 0 0.9239 0.9239 0 0.3827
  [3,16,0.7071,0,0.7071,0.3827,0,0.9239,0.9239,0,0.3827],
];
module ldraw_lib__1_4chrd(step=0, col=false, unit=2/5, alt=false, line=0.2, solid=!$preview)
    makepoly(ldraw_lib__1_4chrd(solid), step=step, col=col, unit=unit, alt=alt, line=line, solid=solid);
ldraw_lib__1_4chrd(line=0.2);
// main file
use <../lib.scad>
use <../p/1-4chrd.scad>
use <../p/1-4cyli.scad>
use <../p/1-4ndis.scad>
use <../p/box3u12.scad>
$fa=1; $fs=0.2;
function ldraw_lib__4121723p(realsolid=false) = [
// 0 Sticker  0.8 x  3 with Black Grille and Transparent Background
// 0 Name: 4121723p.dat
// 0 Author: Ulrich Röder [UR]
// 0 !LDRAW_ORG Part UPDATE 2022-02
// 0 !LICENSE Licensed under CC BY 2.0 and CC BY 4.0 : see CAreadme.txt
// 
// 0 BFC CERTIFY CCW
  [0,"BFC","CERTIFY"],
  [0,"BFC","CCW"],
// 
// 0 !KEYWORDS Model Team, Racing Truck, Set 5563
// 
// 0 !HISTORY 2021-08-16 [MagFors] Added NOCLIP
// 0 !HISTORY 2022-03-06 [PTadmin] Official Update 2022-02
// 
// 
// 0 // Body
// 
// 1 16 0 -0.25 0 29 0 0 0 0.25 0 0 0 8 box3u12.dat
  [1,16,0,-0.25,0,29,0,0,0,0.25,0,0,0,8, ldraw_lib__box3u12(realsolid)],
// 1 16 -29 0 7 0 0 -1 0 -.25 0 1 0 0 1-4cyli.dat
  [1,16,-29,0,7,0,0,-1,0,-.25,0,1,0,0, ldraw_lib__1_4cyli(realsolid)],
// 1 16 -29 0 -7 0 0 -1 0 -.25 0 -1 0 0 1-4cyli.dat
  [1,16,-29,0,-7,0,0,-1,0,-.25,0,-1,0,0, ldraw_lib__1_4cyli(realsolid)],
// 1 16 29 0 -7 0 0 1 0 -.25 0 -1 0 0 1-4cyli.dat
  [1,16,29,0,-7,0,0,1,0,-.25,0,-1,0,0, ldraw_lib__1_4cyli(realsolid)],
// 1 16 29 0 7 1 0 0 0 -.25 0 0 0 1 1-4cyli.dat
  [1,16,29,0,7,1,0,0,0,-.25,0,0,0,1, ldraw_lib__1_4cyli(realsolid)],
// 1 16 -29 0 7 0 0 -1 0 -1 0 1 0 0 1-4chrd.dat
  [1,16,-29,0,7,0,0,-1,0,-1,0,1,0,0, ldraw_lib__1_4chrd(realsolid)],
// 1 16 -29 0 -7 0 0 -1 0 -1 0 -1 0 0 1-4chrd.dat
  [1,16,-29,0,-7,0,0,-1,0,-1,0,-1,0,0, ldraw_lib__1_4chrd(realsolid)],
// 1 16 29 0 -7 0 0 1 0 -1 0 -1 0 0 1-4chrd.dat
  [1,16,29,0,-7,0,0,1,0,-1,0,-1,0,0, ldraw_lib__1_4chrd(realsolid)],
// 1 16 29 0 7 1 0 0 0 -1 0 0 0 1 1-4chrd.dat
  [1,16,29,0,7,1,0,0,0,-1,0,0,0,1, ldraw_lib__1_4chrd(realsolid)],
// 4 16 29 0 8 30 0 7 30 0 -7 29 0 -8
  [4,16,29,0,8,30,0,7,30,0,-7,29,0,-8],
// 4 16 -29 0 -8 -30 0 -7 -30 0 7 -29 0 8
  [4,16,-29,0,-8,-30,0,-7,-30,0,7,-29,0,8],
// 4 16 -30 -.25 7 -30 0 7 -30 0 -7 -30 -.25 -7
  [4,16,-30,-.25,7,-30,0,7,-30,0,-7,-30,-.25,-7],
// 4 16 30 0 -7 30 0 7 30 -.25 7 30 -.25 -7
  [4,16,30,0,-7,30,0,7,30,-.25,7,30,-.25,-7],
// 
// 0 // Frontface
// 0 // Grill
// 0 BFC NOCLIP
  [0,"BFC","NOCLIP"],
// 4 0 25 -.25 4 25 -.25 6 -25 -.25 6 -25 -.25 4
  [4,0,25,-.25,4,25,-.25,6,-25,-.25,6,-25,-.25,4],
// 4 0 -26 -.25 2 26 -.25 2 26 -.25 3 -26 -.25 3
  [4,0,-26,-.25,2,26,-.25,2,26,-.25,3,-26,-.25,3],
// 4 0 26 -.25 .5 -26 -.25 .5 -26 -.25 -.5 26 -.25 -.5
  [4,0,26,-.25,.5,-26,-.25,.5,-26,-.25,-.5,26,-.25,-.5],
// 4 0 -26 -.25 -2 -26 -.25 -3 26 -.25 -3 26 -.25 -2
  [4,0,-26,-.25,-2,-26,-.25,-3,26,-.25,-3,26,-.25,-2],
// 4 0 25 -.25 -4 -25 -.25 -4 -25 -.25 -6 25 -.25 -6
  [4,0,25,-.25,-4,-25,-.25,-4,-25,-.25,-6,25,-.25,-6],
// 3 0 -26 -.25 3 -28 -.25 3 -26 -.25 2
  [3,0,-26,-.25,3,-28,-.25,3,-26,-.25,2],
// 3 0 -28 -.25 3 -26 -.25 .5 -26 -.25 2
  [3,0,-28,-.25,3,-26,-.25,.5,-26,-.25,2],
// 4 0 -26 -.25 -.5 -26 -.25 .5 -28 -.25 3 -28 -.25 -3
  [4,0,-26,-.25,-.5,-26,-.25,.5,-28,-.25,3,-28,-.25,-3],
// 3 0 -26 -.25 -.5 -28 -.25 -3 -26 -.25 -2
  [3,0,-26,-.25,-.5,-28,-.25,-3,-26,-.25,-2],
// 3 0 -26 -.25 -2 -28 -.25 -3 -26 -.25 -3
  [3,0,-26,-.25,-2,-28,-.25,-3,-26,-.25,-3],
// 3 0 28 -.25 3 26 -.25 3 26 -.25 2
  [3,0,28,-.25,3,26,-.25,3,26,-.25,2],
// 4 0 28 -.25 3 26 -.25 .5 26 -.25 -.5 28 -.25 -3
  [4,0,28,-.25,3,26,-.25,.5,26,-.25,-.5,28,-.25,-3],
// 3 0 26 -.25 -.5 26 -.25 -2 28 -.25 -3
  [3,0,26,-.25,-.5,26,-.25,-2,28,-.25,-3],
// 3 0 26 -.25 -2 26 -.25 -3 28 -.25 -3
  [3,0,26,-.25,-2,26,-.25,-3,28,-.25,-3],
// 3 0 28 -.25 3 26 -.25 2 26 -.25 .5
  [3,0,28,-.25,3,26,-.25,2,26,-.25,.5],
// 1 0 -25 -.25 3 0 0 -1 0 1 0 1 0 0 1-4ndis.dat
  [1,0,-25,-.25,3,0,0,-1,0,1,0,1,0,0, ldraw_lib__1_4ndis(realsolid)],
// 1 0 25 -.25 3 1 0 0 0 1 0 0 0 1 1-4ndis.dat
  [1,0,25,-.25,3,1,0,0,0,1,0,0,0,1, ldraw_lib__1_4ndis(realsolid)],
// 1 0 25 -.25 -3 0 0 1 0 1 0 -1 0 0 1-4ndis.dat
  [1,0,25,-.25,-3,0,0,1,0,1,0,-1,0,0, ldraw_lib__1_4ndis(realsolid)],
// 1 0 -25 -.25 -3 -1 0 0 0 1 0 0 0 -1 1-4ndis.dat
  [1,0,-25,-.25,-3,-1,0,0,0,1,0,0,0,-1, ldraw_lib__1_4ndis(realsolid)],
// 1 0 -25 -.25 3 0 0 -3 0 1 0 3 0 0 1-4chrd.dat
  [1,0,-25,-.25,3,0,0,-3,0,1,0,3,0,0, ldraw_lib__1_4chrd(realsolid)],
// 1 0 25 -.25 3 3 0 0 0 1 0 0 0 3 1-4chrd.dat
  [1,0,25,-.25,3,3,0,0,0,1,0,0,0,3, ldraw_lib__1_4chrd(realsolid)],
// 1 0 25 -.25 -3 0 0 3 0 1 0 -3 0 0 1-4chrd.dat
  [1,0,25,-.25,-3,0,0,3,0,1,0,-3,0,0, ldraw_lib__1_4chrd(realsolid)],
// 1 0 -25 -.25 -3 -3 0 0 0 1 0 0 0 -3 1-4chrd.dat
  [1,0,-25,-.25,-3,-3,0,0,0,1,0,0,0,-3, ldraw_lib__1_4chrd(realsolid)],
// 3 0 28 -.25 -3 26 -.25 -3 26 -.25 -4
  [3,0,28,-.25,-3,26,-.25,-3,26,-.25,-4],
// 3 0 25 -.25 -4 25 -.25 -6 26 -.25 -4
  [3,0,25,-.25,-4,25,-.25,-6,26,-.25,-4],
// 3 0 26 -.25 -4 25 -.25 -6 28 -.25 -3
  [3,0,26,-.25,-4,25,-.25,-6,28,-.25,-3],
// 3 0 25 -.25 6 25 -.25 4 26 -.25 4
  [3,0,25,-.25,6,25,-.25,4,26,-.25,4],
// 3 0 26 -.25 4 26 -.25 3 28 -.25 3
  [3,0,26,-.25,4,26,-.25,3,28,-.25,3],
// 3 0 25 -.25 6 26 -.25 4 28 -.25 3
  [3,0,25,-.25,6,26,-.25,4,28,-.25,3],
// 3 0 -25 -.25 4 -25 -.25 6 -26 -.25 4
  [3,0,-25,-.25,4,-25,-.25,6,-26,-.25,4],
// 3 0 -28 -.25 3 -26 -.25 3 -26 -.25 4
  [3,0,-28,-.25,3,-26,-.25,3,-26,-.25,4],
// 3 0 -26 -.25 4 -25 -.25 6 -28 -.25 3
  [3,0,-26,-.25,4,-25,-.25,6,-28,-.25,3],
// 3 0 -26 -.25 -4 -26 -.25 -3 -28 -.25 -3
  [3,0,-26,-.25,-4,-26,-.25,-3,-28,-.25,-3],
// 3 0 -25 -.25 -6 -25 -.25 -4 -26 -.25 -4
  [3,0,-25,-.25,-6,-25,-.25,-4,-26,-.25,-4],
// 3 0 -25 -.25 -6 -26 -.25 -4 -28 -.25 -3
  [3,0,-25,-.25,-6,-26,-.25,-4,-28,-.25,-3],
// 0 BFC CLIP
  [0,"BFC","CLIP"],
// 
// 0 // Cutout
// 1 16 -25 -.25 3 0 0 -1 0 1 0 1 0 0 1-4chrd.dat
  [1,16,-25,-.25,3,0,0,-1,0,1,0,1,0,0, ldraw_lib__1_4chrd(realsolid)],
// 1 16 25 -.25 3 1 0 0 0 1 0 0 0 1 1-4chrd.dat
  [1,16,25,-.25,3,1,0,0,0,1,0,0,0,1, ldraw_lib__1_4chrd(realsolid)],
// 1 16 25 -.25 -3 0 0 1 0 1 0 -1 0 0 1-4chrd.dat
  [1,16,25,-.25,-3,0,0,1,0,1,0,-1,0,0, ldraw_lib__1_4chrd(realsolid)],
// 1 16 -25 -.25 -3 -1 0 0 0 1 0 0 0 -1 1-4chrd.dat
  [1,16,-25,-.25,-3,-1,0,0,0,1,0,0,0,-1, ldraw_lib__1_4chrd(realsolid)],
// 4 16 -25 -.25 4 -26 -.25 3 26 -.25 3 25 -.25 4
  [4,16,-25,-.25,4,-26,-.25,3,26,-.25,3,25,-.25,4],
// 4 16 26 -.25 2 -26 -.25 2 -26 -.25 .5 26 -.25 .5
  [4,16,26,-.25,2,-26,-.25,2,-26,-.25,.5,26,-.25,.5],
// 4 16 26 -.25 -.5 -26 -.25 -.5 -26 -.25 -2 26 -.25 -2
  [4,16,26,-.25,-.5,-26,-.25,-.5,-26,-.25,-2,26,-.25,-2],
// 4 16 -26 -.25 -3 -25 -.25 -4 25 -.25 -4 26 -.25 -3
  [4,16,-26,-.25,-3,-25,-.25,-4,25,-.25,-4,26,-.25,-3],
// 1 16 29 -.25 7 1 0 0 0 1 0 0 0 1 1-4chrd.dat
  [1,16,29,-.25,7,1,0,0,0,1,0,0,0,1, ldraw_lib__1_4chrd(realsolid)],
// 1 16 -29 -.25 7 0 0 -1 0 1 0 1 0 0 1-4chrd.dat
  [1,16,-29,-.25,7,0,0,-1,0,1,0,1,0,0, ldraw_lib__1_4chrd(realsolid)],
// 1 16 -29 -.25 -7 0 0 -1 0 1 0 -1 0 0 1-4chrd.dat
  [1,16,-29,-.25,-7,0,0,-1,0,1,0,-1,0,0, ldraw_lib__1_4chrd(realsolid)],
// 1 16 29 -.25 -7 0 0 1 0 1 0 -1 0 0 1-4chrd.dat
  [1,16,29,-.25,-7,0,0,1,0,1,0,-1,0,0, ldraw_lib__1_4chrd(realsolid)],
// 4 16 30 -.25 -7 30 -.25 7 29 -.25 8 29 -.25 -8
  [4,16,30,-.25,-7,30,-.25,7,29,-.25,8,29,-.25,-8],
// 4 16 -30 -.25 7 -30 -.25 -7 -29 -.25 -8 -29 -.25 8
  [4,16,-30,-.25,7,-30,-.25,-7,-29,-.25,-8,-29,-.25,8],
// 1 16 -25 -.25 3 0 0 -3 0 1 0 3 0 0 1-4ndis.dat
  [1,16,-25,-.25,3,0,0,-3,0,1,0,3,0,0, ldraw_lib__1_4ndis(realsolid)],
// 1 16 25 -.25 3 3 0 0 0 1 0 0 0 3 1-4ndis.dat
  [1,16,25,-.25,3,3,0,0,0,1,0,0,0,3, ldraw_lib__1_4ndis(realsolid)],
// 1 16 25 -.25 -3 0 0 3 0 1 0 -3 0 0 1-4ndis.dat
  [1,16,25,-.25,-3,0,0,3,0,1,0,-3,0,0, ldraw_lib__1_4ndis(realsolid)],
// 1 16 -25 -.25 -3 -3 0 0 0 1 0 0 0 -3 1-4ndis.dat
  [1,16,-25,-.25,-3,-3,0,0,0,1,0,0,0,-3, ldraw_lib__1_4ndis(realsolid)],
// 3 16 -29 -.25 8 -28 -.25 6 -25 -.25 6
  [3,16,-29,-.25,8,-28,-.25,6,-25,-.25,6],
// 4 16 25 -.25 6 29 -.25 8 -29 -.25 8 -25 -.25 6
  [4,16,25,-.25,6,29,-.25,8,-29,-.25,8,-25,-.25,6],
// 3 16 29 -.25 8 25 -.25 6 28 -.25 6
  [3,16,29,-.25,8,25,-.25,6,28,-.25,6],
// 3 16 29 -.25 8 28 -.25 6 28 -.25 3
  [3,16,29,-.25,8,28,-.25,6,28,-.25,3],
// 4 16 29 -.25 8 28 -.25 3 28 -.25 -3 29 -.25 -8
  [4,16,29,-.25,8,28,-.25,3,28,-.25,-3,29,-.25,-8],
// 3 16 28 -.25 -3 28 -.25 -6 29 -.25 -8
  [3,16,28,-.25,-3,28,-.25,-6,29,-.25,-8],
// 3 16 28 -.25 -6 25 -.25 -6 29 -.25 -8
  [3,16,28,-.25,-6,25,-.25,-6,29,-.25,-8],
// 4 16 29 -.25 -8 25 -.25 -6 -25 -.25 -6 -29 -.25 -8
  [4,16,29,-.25,-8,25,-.25,-6,-25,-.25,-6,-29,-.25,-8],
// 3 16 -25 -.25 -6 -28 -.25 -6 -29 -.25 -8
  [3,16,-25,-.25,-6,-28,-.25,-6,-29,-.25,-8],
// 3 16 -28 -.25 -3 -29 -.25 -8 -28 -.25 -6
  [3,16,-28,-.25,-3,-29,-.25,-8,-28,-.25,-6],
// 4 16 -29 -.25 -8 -28 -.25 -3 -28 -.25 3 -29 -.25 8
  [4,16,-29,-.25,-8,-28,-.25,-3,-28,-.25,3,-29,-.25,8],
// 3 16 -29 -.25 8 -28 -.25 3 -28 -.25 6
  [3,16,-29,-.25,8,-28,-.25,3,-28,-.25,6],
];
module ldraw_lib__4121723p(step=0, col=false, unit=2/5, alt=false, line=0.2, solid=!$preview)
    makepoly(ldraw_lib__4121723p(solid), step=step, col=col, unit=unit, alt=alt, line=line, solid=solid);
ldraw_lib__4121723p(line=0.2);
